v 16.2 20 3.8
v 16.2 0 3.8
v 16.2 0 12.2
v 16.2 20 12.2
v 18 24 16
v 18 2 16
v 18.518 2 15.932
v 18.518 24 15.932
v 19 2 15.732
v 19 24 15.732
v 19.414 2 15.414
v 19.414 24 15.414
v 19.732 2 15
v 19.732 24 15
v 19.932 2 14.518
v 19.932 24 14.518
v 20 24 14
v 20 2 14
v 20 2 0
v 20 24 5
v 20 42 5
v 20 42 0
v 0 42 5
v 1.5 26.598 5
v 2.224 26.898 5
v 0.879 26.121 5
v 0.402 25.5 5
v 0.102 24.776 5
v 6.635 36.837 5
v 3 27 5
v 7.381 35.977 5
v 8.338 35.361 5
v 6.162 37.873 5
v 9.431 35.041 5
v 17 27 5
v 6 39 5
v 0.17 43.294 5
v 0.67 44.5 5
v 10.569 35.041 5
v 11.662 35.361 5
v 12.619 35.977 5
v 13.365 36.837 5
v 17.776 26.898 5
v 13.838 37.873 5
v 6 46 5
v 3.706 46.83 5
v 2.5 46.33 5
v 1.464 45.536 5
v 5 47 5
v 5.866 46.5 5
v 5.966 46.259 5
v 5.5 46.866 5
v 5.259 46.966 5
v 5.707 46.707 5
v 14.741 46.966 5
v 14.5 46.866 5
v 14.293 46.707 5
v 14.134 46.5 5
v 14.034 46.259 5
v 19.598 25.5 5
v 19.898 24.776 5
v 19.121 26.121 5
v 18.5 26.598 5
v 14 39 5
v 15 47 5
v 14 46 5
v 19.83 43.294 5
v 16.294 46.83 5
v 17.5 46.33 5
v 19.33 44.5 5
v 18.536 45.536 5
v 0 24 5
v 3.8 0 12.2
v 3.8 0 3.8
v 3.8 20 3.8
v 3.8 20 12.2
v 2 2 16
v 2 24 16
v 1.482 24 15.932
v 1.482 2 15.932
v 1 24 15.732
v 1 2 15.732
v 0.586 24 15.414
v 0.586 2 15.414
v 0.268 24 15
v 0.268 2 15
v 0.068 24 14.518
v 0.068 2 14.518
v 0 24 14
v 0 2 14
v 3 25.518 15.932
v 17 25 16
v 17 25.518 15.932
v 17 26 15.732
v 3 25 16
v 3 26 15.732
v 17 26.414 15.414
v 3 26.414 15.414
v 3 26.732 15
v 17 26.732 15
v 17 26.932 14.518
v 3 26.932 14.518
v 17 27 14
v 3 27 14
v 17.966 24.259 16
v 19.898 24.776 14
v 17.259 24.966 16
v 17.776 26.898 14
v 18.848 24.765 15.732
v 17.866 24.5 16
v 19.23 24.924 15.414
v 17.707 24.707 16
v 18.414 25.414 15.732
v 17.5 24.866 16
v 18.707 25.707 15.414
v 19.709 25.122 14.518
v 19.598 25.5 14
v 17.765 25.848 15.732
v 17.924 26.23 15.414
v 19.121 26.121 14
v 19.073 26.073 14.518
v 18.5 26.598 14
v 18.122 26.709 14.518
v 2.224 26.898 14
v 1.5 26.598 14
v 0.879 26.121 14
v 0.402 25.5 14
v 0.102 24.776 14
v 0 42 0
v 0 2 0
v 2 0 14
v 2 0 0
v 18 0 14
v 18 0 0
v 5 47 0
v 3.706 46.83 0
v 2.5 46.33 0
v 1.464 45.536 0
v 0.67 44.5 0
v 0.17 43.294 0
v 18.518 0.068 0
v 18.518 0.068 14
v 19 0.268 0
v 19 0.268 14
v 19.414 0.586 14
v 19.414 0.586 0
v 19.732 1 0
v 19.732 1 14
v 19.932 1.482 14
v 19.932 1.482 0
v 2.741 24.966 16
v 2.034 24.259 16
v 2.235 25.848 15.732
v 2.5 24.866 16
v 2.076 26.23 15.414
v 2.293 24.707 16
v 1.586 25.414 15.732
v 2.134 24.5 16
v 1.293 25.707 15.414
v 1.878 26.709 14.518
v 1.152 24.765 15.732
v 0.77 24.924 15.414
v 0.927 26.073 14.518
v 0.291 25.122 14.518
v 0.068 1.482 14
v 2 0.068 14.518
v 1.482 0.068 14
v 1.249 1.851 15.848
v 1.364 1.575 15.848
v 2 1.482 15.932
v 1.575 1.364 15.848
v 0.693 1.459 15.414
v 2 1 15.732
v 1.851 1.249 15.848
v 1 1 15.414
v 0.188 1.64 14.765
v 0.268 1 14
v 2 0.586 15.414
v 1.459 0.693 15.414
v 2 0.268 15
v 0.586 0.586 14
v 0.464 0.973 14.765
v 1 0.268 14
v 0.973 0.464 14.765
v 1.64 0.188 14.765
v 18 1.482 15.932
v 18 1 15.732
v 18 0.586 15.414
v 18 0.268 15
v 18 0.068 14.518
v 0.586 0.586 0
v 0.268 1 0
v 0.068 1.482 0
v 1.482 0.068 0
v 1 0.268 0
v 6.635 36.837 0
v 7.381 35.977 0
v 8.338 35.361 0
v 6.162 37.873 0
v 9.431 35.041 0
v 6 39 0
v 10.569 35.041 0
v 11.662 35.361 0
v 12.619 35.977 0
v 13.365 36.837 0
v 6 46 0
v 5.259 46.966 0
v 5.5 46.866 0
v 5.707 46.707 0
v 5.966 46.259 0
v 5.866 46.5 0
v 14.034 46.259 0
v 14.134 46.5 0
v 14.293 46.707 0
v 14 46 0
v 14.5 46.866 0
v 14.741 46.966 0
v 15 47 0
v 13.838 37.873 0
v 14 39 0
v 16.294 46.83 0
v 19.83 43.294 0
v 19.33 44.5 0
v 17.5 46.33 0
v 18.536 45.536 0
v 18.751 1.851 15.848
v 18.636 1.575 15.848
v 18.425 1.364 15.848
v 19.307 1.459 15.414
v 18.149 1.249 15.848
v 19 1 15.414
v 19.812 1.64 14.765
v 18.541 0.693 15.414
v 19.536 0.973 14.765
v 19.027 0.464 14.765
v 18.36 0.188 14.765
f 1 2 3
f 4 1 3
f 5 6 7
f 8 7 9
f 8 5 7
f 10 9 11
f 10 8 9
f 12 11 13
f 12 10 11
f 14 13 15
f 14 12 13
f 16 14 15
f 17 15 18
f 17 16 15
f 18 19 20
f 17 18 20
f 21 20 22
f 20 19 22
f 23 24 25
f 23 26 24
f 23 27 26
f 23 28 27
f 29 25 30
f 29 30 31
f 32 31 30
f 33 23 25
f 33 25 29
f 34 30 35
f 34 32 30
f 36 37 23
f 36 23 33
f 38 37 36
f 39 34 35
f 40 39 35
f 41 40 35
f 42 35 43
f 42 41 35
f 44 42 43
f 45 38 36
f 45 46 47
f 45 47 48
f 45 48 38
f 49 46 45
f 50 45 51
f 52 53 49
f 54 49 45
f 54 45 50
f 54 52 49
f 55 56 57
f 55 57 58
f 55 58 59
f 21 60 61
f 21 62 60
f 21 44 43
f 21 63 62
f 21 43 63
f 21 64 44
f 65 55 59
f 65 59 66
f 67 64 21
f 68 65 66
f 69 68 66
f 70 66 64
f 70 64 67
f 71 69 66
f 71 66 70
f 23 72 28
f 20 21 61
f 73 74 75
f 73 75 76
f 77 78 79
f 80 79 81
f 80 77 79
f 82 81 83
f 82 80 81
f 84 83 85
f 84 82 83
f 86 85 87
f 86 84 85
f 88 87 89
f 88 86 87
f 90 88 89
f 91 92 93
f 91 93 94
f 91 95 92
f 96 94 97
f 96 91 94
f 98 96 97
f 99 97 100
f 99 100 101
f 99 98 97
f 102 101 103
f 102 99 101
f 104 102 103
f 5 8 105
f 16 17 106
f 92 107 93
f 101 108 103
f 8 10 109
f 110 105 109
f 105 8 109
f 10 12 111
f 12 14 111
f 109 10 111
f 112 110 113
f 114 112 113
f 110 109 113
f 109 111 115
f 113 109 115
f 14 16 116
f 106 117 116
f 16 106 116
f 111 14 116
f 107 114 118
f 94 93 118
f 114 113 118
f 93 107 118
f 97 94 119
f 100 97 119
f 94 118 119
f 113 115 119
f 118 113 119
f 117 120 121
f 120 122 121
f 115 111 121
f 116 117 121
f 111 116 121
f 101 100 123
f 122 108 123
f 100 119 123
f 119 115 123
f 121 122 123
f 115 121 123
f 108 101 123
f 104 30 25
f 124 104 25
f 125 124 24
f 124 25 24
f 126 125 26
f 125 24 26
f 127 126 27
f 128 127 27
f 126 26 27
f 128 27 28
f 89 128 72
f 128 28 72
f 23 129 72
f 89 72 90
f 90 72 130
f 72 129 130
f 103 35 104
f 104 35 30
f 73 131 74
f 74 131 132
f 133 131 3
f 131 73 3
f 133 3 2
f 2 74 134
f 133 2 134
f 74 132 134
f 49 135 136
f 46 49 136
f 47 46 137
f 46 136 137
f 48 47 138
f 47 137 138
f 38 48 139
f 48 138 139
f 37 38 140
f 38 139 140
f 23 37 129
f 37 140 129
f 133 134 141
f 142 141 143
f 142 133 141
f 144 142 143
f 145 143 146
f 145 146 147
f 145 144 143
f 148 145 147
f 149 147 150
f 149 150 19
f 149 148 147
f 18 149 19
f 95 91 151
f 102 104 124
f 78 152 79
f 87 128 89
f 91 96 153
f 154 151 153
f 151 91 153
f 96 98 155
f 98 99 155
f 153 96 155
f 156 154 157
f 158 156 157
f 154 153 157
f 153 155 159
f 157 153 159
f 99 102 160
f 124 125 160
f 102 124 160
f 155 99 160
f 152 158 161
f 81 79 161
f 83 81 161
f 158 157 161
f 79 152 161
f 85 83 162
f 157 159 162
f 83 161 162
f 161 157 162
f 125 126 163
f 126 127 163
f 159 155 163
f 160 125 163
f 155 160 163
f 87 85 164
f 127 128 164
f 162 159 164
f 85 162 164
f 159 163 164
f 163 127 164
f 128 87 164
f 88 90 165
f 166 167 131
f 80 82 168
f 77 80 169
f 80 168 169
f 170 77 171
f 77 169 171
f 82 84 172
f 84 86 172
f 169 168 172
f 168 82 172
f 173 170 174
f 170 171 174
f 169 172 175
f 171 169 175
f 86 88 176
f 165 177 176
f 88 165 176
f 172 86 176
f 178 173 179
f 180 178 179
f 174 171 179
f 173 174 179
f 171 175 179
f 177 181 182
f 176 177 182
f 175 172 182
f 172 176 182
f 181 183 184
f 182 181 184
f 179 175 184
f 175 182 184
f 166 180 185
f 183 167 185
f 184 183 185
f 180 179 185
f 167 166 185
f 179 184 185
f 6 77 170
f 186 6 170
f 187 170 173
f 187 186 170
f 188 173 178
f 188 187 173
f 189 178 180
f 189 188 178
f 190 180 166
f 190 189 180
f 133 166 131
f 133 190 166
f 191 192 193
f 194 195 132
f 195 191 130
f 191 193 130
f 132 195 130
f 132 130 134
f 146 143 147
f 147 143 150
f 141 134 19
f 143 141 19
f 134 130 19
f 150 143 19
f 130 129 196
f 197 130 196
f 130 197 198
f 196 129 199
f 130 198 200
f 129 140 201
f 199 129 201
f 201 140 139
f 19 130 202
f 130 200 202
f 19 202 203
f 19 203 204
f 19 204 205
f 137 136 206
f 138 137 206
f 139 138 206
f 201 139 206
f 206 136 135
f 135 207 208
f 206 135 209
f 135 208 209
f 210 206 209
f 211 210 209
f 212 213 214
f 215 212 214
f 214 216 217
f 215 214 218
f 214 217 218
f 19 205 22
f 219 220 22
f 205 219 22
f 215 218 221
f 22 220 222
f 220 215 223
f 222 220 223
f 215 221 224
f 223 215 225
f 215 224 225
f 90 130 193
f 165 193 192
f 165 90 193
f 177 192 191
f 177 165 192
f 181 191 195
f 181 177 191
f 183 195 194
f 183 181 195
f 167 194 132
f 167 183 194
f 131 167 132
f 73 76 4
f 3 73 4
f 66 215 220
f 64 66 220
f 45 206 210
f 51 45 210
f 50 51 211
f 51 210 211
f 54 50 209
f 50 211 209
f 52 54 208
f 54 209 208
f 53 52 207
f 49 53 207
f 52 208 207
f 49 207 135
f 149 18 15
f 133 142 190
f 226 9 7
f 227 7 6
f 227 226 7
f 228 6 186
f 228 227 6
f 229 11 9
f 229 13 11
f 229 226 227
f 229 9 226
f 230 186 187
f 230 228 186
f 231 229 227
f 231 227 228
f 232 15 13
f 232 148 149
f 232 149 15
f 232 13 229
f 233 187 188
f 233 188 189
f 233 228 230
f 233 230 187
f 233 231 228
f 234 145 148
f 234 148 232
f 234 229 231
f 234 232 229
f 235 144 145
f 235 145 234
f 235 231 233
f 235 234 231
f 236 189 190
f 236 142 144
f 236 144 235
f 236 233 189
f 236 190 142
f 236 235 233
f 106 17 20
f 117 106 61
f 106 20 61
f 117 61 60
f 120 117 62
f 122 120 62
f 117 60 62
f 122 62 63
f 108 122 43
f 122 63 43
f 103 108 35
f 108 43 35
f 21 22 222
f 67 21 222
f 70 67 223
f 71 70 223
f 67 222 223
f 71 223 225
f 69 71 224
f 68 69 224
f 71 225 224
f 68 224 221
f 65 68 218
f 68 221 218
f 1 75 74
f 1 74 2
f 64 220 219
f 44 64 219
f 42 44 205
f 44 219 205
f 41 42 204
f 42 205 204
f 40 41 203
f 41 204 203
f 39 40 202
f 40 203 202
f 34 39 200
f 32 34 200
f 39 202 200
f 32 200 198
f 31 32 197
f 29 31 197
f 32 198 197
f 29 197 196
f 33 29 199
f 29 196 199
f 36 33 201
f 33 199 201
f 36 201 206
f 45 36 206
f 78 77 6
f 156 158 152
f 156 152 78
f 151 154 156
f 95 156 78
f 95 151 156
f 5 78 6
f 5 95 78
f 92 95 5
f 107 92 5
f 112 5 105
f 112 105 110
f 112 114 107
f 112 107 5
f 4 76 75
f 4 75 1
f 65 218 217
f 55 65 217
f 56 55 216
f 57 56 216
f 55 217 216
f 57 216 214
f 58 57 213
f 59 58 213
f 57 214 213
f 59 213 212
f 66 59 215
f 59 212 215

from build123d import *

# Parameters (mm, degrees)
F1_DEPTH = 5
F3_DEPTH = 11
F4_W     = 12.4
F4_H     = 8.4
F5_DEPTH = 20
F6_R     = 2


with BuildPart() as f1:
    # F0 (on Top) → F1 (new body)
    with BuildSketch(Plane.XY):
        with BuildLine():
            Line((0, 42), (0, 0))
            Line((0, 0), (20, 0))
            Line((20, 0), (20, 42))
            ThreePointArc((20, 42), (18.535534, 45.535534), (15, 47))
            ThreePointArc((15, 47), (14.292893, 46.707107), (14, 46))
            Line((14, 46), (14, 39))
            ThreePointArc((14, 39), (10, 35), (6, 39))
            Line((6, 39), (6, 46))
            ThreePointArc((6, 46), (5.707107, 46.707107), (5, 47))
            ThreePointArc((5, 47), (1.464466, 45.535534), (0, 42))
        make_face()
    extrude(amount=F1_DEPTH)

    # F2 (on face) → F3 (join)
    with BuildSketch(Plane.XY.offset(5)):
        with BuildLine():
            Line((0, 24), (0, 0))
            Line((0, 0), (20, 0))
            Line((20, 0), (20, 24))
            ThreePointArc((20, 24), (19.12132, 26.12132), (17, 27))
            Line((17, 27), (3, 27))
            ThreePointArc((3, 27), (0.87868, 26.12132), (0, 24))
        make_face()
    extrude(amount=F3_DEPTH)

    # F4 (on face) → F5 (cut)
    with BuildSketch(Plane.XZ):
        with Locations((10, 8)):
            Rectangle(F4_W, F4_H)
    extrude(amount=-F5_DEPTH, mode=Mode.SUBTRACT)

    # F6
    f6_edges = [f1.edges().sort_by_distance(p)[0] for p in [
        (0, 0, 8),
        (20, 0, 8),
        (20, 12, 16),
        (10, 0, 16),
    ]]
    fillet(f6_edges, radius=F6_R)


solid = f1.part
